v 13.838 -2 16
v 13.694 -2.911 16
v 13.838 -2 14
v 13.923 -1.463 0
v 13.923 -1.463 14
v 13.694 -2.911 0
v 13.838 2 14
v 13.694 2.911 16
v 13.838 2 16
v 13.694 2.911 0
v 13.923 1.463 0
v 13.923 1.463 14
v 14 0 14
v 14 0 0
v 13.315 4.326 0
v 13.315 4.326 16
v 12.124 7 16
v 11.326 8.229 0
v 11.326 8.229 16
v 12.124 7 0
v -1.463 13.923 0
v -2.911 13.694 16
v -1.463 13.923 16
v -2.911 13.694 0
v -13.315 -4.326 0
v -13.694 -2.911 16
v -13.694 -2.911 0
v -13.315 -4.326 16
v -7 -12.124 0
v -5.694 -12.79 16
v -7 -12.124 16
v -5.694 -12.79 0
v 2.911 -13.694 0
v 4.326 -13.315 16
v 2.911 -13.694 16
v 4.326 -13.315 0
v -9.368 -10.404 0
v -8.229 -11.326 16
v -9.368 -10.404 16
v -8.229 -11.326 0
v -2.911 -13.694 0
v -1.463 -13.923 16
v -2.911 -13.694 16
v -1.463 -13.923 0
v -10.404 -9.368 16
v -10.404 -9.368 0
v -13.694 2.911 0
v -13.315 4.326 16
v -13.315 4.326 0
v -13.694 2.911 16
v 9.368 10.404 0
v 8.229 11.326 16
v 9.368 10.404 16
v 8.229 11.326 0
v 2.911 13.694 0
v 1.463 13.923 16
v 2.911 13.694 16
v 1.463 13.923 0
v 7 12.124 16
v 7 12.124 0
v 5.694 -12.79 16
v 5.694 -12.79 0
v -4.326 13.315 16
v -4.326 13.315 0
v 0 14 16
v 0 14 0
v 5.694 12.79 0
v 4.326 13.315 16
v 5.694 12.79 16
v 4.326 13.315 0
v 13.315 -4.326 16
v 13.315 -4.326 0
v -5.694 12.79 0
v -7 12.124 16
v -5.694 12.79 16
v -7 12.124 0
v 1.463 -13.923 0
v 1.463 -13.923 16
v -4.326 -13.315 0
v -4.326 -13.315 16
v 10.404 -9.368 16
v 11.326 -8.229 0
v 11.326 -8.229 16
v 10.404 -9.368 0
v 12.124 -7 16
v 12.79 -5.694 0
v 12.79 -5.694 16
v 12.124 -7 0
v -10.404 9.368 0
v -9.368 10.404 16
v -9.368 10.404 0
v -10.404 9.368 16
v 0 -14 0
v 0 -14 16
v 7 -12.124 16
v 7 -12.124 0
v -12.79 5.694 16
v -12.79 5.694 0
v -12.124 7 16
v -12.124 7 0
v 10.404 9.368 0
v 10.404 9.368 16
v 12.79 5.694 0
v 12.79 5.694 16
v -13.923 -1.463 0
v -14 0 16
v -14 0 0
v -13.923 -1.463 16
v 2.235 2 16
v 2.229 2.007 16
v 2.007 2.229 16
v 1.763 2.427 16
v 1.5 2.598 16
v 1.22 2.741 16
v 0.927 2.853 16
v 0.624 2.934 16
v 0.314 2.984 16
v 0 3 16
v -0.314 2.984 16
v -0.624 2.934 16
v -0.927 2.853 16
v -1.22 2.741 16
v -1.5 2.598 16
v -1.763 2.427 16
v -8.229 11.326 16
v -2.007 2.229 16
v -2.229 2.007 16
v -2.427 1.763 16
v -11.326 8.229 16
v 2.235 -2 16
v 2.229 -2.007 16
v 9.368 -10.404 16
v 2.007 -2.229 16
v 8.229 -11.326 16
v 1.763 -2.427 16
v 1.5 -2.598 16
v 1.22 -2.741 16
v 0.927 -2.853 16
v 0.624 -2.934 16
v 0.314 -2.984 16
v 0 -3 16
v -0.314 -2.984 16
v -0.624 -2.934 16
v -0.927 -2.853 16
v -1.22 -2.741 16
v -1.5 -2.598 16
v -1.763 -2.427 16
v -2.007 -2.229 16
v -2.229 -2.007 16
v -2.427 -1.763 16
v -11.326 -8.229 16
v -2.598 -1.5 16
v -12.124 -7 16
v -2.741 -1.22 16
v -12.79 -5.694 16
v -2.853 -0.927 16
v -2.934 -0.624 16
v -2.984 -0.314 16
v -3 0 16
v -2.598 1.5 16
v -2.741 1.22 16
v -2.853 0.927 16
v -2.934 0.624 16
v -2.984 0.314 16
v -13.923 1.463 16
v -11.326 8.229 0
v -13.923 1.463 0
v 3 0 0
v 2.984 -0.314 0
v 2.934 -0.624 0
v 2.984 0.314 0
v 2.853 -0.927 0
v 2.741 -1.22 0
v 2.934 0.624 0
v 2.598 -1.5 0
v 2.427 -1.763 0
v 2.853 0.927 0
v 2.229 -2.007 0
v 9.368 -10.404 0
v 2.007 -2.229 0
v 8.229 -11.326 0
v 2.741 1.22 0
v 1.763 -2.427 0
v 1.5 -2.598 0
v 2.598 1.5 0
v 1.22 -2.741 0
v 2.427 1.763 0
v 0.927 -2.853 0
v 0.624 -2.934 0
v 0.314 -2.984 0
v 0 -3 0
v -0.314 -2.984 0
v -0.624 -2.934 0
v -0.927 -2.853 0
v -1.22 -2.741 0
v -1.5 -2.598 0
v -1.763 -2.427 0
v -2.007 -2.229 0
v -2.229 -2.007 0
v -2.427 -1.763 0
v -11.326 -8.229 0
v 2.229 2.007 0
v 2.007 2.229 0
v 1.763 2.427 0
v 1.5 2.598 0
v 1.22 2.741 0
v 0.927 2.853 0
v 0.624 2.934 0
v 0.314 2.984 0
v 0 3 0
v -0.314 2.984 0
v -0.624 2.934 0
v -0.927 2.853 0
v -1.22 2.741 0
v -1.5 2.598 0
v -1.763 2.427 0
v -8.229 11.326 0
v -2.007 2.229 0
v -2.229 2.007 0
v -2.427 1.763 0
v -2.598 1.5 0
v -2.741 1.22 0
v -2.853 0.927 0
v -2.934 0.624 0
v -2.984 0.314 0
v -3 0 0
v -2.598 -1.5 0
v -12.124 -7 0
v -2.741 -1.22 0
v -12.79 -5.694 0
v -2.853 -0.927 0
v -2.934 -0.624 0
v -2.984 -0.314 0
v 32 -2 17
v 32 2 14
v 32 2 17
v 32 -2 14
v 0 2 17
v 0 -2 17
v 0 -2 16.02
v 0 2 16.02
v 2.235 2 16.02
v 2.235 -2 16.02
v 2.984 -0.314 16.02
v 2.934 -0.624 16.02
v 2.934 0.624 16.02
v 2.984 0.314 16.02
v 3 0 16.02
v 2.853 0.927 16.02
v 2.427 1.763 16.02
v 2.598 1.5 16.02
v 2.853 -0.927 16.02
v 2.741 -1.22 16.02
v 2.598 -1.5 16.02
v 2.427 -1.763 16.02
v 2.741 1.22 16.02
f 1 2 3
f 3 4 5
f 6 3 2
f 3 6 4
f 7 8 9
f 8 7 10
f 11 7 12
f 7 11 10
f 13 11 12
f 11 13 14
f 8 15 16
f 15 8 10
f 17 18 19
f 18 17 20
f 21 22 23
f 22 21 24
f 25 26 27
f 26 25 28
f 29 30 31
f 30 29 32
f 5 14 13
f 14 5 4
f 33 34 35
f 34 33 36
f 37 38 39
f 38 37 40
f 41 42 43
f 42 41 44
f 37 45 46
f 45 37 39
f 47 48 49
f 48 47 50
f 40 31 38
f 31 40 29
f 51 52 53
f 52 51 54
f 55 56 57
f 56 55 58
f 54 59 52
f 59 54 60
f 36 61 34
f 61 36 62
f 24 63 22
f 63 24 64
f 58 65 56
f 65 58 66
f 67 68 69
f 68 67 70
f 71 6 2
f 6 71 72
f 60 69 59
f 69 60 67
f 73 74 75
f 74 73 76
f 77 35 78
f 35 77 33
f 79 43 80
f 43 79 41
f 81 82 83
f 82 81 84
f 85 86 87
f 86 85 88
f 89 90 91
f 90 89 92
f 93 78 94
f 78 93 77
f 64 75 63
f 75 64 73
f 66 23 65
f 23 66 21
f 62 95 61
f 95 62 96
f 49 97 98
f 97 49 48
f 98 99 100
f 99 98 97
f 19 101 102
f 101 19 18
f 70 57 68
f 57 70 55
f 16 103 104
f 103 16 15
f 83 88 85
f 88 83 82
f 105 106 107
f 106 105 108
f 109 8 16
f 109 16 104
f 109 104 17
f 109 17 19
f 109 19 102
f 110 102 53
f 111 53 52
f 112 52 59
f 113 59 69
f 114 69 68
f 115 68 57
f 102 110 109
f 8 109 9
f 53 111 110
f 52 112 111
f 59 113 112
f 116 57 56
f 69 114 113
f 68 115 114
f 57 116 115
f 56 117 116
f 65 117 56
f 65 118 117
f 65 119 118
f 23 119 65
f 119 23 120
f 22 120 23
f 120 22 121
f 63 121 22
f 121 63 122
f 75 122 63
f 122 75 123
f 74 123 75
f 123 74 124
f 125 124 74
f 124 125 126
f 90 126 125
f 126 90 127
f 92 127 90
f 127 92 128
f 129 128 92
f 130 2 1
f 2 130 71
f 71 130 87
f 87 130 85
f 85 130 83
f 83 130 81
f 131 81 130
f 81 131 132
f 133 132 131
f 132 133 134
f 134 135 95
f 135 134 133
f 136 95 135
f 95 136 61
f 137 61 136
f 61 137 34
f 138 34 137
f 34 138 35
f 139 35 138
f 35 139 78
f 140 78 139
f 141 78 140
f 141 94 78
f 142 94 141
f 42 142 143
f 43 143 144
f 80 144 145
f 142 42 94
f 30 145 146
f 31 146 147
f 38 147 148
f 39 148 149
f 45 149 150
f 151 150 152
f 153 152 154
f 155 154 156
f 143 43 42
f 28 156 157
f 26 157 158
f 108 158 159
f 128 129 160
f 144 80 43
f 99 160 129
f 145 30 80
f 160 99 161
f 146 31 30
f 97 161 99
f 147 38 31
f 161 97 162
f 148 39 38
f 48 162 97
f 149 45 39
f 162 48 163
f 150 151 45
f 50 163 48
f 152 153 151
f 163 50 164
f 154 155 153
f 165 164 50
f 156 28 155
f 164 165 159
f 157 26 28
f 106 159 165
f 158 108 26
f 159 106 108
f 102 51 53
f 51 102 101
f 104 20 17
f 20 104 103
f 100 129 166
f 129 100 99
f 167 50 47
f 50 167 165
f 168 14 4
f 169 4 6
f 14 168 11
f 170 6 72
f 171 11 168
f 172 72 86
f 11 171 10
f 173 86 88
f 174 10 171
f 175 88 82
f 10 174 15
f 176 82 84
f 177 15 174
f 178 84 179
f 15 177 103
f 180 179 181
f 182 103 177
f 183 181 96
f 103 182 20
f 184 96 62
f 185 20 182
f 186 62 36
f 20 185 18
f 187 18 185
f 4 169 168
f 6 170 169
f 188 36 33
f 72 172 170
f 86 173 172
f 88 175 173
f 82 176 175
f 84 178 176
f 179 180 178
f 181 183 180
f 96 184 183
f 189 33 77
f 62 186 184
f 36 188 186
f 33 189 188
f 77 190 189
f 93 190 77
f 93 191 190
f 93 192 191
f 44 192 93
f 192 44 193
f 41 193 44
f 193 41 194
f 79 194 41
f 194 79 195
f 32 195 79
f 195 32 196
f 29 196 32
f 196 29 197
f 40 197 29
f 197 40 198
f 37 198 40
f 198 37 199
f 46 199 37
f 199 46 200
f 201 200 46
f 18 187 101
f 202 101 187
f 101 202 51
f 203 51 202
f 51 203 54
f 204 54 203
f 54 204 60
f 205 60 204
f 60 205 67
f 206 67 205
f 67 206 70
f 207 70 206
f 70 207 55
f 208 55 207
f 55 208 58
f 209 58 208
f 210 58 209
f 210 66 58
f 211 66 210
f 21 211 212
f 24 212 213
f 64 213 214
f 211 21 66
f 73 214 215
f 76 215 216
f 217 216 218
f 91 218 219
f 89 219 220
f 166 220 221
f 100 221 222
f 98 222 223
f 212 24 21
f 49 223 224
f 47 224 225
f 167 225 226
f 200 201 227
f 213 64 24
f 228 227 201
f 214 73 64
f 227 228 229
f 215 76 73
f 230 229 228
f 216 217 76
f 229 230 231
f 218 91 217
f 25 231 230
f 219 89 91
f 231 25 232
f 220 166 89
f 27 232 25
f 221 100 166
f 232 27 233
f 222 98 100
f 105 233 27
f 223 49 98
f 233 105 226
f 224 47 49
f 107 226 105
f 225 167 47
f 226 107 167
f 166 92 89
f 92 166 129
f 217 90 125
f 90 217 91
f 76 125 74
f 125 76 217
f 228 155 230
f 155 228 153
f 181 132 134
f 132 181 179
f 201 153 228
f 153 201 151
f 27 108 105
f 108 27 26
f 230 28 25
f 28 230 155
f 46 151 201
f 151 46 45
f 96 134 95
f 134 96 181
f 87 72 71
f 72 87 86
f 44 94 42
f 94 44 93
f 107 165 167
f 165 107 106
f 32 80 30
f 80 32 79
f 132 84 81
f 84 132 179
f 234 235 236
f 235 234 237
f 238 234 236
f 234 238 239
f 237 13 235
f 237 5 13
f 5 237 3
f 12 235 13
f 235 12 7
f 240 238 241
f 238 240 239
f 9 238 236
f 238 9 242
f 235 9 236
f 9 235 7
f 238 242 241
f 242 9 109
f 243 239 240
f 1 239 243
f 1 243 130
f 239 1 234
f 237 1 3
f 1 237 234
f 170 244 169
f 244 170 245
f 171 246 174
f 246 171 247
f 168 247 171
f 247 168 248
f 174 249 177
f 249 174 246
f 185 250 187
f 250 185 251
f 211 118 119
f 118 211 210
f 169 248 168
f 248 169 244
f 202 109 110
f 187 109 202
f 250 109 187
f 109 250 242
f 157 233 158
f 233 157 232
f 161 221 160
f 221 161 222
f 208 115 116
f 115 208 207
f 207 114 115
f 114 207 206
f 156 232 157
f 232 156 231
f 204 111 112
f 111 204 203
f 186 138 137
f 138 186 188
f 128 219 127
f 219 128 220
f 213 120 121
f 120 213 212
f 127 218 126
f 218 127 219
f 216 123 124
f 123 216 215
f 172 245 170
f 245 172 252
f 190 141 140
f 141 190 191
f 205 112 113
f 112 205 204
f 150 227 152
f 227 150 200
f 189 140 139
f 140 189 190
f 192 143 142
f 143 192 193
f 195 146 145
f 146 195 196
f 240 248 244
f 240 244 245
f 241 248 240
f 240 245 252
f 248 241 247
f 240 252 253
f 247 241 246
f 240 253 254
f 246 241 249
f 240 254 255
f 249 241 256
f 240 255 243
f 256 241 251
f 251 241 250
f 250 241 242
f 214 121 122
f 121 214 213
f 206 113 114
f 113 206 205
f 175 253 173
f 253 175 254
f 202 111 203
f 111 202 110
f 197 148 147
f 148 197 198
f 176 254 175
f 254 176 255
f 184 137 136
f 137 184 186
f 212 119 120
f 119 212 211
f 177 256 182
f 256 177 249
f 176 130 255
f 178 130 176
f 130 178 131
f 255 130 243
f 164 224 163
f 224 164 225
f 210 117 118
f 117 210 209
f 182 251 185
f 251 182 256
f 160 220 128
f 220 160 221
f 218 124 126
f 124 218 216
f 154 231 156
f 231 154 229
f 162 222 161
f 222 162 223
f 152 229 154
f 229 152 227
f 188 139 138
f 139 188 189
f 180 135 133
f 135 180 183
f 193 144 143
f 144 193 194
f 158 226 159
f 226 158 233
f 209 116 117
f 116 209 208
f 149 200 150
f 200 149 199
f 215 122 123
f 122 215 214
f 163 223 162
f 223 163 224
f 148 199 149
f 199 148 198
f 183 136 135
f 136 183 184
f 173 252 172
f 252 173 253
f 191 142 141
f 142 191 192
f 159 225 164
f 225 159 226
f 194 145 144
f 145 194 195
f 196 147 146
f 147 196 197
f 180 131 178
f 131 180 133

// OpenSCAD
// Quarter-turn cam lock.
$fn = 60;
eps = 0.02;
body_d = 28;
body_l = 16;
arm_l = 32;
difference() { union() { cylinder(d=body_d,h=body_l); translate([0,-2,body_l-2]) cube([arm_l,4,3]); } translate([0,0,-eps]) cylinder(d=6,h=body_l+2*eps); }
